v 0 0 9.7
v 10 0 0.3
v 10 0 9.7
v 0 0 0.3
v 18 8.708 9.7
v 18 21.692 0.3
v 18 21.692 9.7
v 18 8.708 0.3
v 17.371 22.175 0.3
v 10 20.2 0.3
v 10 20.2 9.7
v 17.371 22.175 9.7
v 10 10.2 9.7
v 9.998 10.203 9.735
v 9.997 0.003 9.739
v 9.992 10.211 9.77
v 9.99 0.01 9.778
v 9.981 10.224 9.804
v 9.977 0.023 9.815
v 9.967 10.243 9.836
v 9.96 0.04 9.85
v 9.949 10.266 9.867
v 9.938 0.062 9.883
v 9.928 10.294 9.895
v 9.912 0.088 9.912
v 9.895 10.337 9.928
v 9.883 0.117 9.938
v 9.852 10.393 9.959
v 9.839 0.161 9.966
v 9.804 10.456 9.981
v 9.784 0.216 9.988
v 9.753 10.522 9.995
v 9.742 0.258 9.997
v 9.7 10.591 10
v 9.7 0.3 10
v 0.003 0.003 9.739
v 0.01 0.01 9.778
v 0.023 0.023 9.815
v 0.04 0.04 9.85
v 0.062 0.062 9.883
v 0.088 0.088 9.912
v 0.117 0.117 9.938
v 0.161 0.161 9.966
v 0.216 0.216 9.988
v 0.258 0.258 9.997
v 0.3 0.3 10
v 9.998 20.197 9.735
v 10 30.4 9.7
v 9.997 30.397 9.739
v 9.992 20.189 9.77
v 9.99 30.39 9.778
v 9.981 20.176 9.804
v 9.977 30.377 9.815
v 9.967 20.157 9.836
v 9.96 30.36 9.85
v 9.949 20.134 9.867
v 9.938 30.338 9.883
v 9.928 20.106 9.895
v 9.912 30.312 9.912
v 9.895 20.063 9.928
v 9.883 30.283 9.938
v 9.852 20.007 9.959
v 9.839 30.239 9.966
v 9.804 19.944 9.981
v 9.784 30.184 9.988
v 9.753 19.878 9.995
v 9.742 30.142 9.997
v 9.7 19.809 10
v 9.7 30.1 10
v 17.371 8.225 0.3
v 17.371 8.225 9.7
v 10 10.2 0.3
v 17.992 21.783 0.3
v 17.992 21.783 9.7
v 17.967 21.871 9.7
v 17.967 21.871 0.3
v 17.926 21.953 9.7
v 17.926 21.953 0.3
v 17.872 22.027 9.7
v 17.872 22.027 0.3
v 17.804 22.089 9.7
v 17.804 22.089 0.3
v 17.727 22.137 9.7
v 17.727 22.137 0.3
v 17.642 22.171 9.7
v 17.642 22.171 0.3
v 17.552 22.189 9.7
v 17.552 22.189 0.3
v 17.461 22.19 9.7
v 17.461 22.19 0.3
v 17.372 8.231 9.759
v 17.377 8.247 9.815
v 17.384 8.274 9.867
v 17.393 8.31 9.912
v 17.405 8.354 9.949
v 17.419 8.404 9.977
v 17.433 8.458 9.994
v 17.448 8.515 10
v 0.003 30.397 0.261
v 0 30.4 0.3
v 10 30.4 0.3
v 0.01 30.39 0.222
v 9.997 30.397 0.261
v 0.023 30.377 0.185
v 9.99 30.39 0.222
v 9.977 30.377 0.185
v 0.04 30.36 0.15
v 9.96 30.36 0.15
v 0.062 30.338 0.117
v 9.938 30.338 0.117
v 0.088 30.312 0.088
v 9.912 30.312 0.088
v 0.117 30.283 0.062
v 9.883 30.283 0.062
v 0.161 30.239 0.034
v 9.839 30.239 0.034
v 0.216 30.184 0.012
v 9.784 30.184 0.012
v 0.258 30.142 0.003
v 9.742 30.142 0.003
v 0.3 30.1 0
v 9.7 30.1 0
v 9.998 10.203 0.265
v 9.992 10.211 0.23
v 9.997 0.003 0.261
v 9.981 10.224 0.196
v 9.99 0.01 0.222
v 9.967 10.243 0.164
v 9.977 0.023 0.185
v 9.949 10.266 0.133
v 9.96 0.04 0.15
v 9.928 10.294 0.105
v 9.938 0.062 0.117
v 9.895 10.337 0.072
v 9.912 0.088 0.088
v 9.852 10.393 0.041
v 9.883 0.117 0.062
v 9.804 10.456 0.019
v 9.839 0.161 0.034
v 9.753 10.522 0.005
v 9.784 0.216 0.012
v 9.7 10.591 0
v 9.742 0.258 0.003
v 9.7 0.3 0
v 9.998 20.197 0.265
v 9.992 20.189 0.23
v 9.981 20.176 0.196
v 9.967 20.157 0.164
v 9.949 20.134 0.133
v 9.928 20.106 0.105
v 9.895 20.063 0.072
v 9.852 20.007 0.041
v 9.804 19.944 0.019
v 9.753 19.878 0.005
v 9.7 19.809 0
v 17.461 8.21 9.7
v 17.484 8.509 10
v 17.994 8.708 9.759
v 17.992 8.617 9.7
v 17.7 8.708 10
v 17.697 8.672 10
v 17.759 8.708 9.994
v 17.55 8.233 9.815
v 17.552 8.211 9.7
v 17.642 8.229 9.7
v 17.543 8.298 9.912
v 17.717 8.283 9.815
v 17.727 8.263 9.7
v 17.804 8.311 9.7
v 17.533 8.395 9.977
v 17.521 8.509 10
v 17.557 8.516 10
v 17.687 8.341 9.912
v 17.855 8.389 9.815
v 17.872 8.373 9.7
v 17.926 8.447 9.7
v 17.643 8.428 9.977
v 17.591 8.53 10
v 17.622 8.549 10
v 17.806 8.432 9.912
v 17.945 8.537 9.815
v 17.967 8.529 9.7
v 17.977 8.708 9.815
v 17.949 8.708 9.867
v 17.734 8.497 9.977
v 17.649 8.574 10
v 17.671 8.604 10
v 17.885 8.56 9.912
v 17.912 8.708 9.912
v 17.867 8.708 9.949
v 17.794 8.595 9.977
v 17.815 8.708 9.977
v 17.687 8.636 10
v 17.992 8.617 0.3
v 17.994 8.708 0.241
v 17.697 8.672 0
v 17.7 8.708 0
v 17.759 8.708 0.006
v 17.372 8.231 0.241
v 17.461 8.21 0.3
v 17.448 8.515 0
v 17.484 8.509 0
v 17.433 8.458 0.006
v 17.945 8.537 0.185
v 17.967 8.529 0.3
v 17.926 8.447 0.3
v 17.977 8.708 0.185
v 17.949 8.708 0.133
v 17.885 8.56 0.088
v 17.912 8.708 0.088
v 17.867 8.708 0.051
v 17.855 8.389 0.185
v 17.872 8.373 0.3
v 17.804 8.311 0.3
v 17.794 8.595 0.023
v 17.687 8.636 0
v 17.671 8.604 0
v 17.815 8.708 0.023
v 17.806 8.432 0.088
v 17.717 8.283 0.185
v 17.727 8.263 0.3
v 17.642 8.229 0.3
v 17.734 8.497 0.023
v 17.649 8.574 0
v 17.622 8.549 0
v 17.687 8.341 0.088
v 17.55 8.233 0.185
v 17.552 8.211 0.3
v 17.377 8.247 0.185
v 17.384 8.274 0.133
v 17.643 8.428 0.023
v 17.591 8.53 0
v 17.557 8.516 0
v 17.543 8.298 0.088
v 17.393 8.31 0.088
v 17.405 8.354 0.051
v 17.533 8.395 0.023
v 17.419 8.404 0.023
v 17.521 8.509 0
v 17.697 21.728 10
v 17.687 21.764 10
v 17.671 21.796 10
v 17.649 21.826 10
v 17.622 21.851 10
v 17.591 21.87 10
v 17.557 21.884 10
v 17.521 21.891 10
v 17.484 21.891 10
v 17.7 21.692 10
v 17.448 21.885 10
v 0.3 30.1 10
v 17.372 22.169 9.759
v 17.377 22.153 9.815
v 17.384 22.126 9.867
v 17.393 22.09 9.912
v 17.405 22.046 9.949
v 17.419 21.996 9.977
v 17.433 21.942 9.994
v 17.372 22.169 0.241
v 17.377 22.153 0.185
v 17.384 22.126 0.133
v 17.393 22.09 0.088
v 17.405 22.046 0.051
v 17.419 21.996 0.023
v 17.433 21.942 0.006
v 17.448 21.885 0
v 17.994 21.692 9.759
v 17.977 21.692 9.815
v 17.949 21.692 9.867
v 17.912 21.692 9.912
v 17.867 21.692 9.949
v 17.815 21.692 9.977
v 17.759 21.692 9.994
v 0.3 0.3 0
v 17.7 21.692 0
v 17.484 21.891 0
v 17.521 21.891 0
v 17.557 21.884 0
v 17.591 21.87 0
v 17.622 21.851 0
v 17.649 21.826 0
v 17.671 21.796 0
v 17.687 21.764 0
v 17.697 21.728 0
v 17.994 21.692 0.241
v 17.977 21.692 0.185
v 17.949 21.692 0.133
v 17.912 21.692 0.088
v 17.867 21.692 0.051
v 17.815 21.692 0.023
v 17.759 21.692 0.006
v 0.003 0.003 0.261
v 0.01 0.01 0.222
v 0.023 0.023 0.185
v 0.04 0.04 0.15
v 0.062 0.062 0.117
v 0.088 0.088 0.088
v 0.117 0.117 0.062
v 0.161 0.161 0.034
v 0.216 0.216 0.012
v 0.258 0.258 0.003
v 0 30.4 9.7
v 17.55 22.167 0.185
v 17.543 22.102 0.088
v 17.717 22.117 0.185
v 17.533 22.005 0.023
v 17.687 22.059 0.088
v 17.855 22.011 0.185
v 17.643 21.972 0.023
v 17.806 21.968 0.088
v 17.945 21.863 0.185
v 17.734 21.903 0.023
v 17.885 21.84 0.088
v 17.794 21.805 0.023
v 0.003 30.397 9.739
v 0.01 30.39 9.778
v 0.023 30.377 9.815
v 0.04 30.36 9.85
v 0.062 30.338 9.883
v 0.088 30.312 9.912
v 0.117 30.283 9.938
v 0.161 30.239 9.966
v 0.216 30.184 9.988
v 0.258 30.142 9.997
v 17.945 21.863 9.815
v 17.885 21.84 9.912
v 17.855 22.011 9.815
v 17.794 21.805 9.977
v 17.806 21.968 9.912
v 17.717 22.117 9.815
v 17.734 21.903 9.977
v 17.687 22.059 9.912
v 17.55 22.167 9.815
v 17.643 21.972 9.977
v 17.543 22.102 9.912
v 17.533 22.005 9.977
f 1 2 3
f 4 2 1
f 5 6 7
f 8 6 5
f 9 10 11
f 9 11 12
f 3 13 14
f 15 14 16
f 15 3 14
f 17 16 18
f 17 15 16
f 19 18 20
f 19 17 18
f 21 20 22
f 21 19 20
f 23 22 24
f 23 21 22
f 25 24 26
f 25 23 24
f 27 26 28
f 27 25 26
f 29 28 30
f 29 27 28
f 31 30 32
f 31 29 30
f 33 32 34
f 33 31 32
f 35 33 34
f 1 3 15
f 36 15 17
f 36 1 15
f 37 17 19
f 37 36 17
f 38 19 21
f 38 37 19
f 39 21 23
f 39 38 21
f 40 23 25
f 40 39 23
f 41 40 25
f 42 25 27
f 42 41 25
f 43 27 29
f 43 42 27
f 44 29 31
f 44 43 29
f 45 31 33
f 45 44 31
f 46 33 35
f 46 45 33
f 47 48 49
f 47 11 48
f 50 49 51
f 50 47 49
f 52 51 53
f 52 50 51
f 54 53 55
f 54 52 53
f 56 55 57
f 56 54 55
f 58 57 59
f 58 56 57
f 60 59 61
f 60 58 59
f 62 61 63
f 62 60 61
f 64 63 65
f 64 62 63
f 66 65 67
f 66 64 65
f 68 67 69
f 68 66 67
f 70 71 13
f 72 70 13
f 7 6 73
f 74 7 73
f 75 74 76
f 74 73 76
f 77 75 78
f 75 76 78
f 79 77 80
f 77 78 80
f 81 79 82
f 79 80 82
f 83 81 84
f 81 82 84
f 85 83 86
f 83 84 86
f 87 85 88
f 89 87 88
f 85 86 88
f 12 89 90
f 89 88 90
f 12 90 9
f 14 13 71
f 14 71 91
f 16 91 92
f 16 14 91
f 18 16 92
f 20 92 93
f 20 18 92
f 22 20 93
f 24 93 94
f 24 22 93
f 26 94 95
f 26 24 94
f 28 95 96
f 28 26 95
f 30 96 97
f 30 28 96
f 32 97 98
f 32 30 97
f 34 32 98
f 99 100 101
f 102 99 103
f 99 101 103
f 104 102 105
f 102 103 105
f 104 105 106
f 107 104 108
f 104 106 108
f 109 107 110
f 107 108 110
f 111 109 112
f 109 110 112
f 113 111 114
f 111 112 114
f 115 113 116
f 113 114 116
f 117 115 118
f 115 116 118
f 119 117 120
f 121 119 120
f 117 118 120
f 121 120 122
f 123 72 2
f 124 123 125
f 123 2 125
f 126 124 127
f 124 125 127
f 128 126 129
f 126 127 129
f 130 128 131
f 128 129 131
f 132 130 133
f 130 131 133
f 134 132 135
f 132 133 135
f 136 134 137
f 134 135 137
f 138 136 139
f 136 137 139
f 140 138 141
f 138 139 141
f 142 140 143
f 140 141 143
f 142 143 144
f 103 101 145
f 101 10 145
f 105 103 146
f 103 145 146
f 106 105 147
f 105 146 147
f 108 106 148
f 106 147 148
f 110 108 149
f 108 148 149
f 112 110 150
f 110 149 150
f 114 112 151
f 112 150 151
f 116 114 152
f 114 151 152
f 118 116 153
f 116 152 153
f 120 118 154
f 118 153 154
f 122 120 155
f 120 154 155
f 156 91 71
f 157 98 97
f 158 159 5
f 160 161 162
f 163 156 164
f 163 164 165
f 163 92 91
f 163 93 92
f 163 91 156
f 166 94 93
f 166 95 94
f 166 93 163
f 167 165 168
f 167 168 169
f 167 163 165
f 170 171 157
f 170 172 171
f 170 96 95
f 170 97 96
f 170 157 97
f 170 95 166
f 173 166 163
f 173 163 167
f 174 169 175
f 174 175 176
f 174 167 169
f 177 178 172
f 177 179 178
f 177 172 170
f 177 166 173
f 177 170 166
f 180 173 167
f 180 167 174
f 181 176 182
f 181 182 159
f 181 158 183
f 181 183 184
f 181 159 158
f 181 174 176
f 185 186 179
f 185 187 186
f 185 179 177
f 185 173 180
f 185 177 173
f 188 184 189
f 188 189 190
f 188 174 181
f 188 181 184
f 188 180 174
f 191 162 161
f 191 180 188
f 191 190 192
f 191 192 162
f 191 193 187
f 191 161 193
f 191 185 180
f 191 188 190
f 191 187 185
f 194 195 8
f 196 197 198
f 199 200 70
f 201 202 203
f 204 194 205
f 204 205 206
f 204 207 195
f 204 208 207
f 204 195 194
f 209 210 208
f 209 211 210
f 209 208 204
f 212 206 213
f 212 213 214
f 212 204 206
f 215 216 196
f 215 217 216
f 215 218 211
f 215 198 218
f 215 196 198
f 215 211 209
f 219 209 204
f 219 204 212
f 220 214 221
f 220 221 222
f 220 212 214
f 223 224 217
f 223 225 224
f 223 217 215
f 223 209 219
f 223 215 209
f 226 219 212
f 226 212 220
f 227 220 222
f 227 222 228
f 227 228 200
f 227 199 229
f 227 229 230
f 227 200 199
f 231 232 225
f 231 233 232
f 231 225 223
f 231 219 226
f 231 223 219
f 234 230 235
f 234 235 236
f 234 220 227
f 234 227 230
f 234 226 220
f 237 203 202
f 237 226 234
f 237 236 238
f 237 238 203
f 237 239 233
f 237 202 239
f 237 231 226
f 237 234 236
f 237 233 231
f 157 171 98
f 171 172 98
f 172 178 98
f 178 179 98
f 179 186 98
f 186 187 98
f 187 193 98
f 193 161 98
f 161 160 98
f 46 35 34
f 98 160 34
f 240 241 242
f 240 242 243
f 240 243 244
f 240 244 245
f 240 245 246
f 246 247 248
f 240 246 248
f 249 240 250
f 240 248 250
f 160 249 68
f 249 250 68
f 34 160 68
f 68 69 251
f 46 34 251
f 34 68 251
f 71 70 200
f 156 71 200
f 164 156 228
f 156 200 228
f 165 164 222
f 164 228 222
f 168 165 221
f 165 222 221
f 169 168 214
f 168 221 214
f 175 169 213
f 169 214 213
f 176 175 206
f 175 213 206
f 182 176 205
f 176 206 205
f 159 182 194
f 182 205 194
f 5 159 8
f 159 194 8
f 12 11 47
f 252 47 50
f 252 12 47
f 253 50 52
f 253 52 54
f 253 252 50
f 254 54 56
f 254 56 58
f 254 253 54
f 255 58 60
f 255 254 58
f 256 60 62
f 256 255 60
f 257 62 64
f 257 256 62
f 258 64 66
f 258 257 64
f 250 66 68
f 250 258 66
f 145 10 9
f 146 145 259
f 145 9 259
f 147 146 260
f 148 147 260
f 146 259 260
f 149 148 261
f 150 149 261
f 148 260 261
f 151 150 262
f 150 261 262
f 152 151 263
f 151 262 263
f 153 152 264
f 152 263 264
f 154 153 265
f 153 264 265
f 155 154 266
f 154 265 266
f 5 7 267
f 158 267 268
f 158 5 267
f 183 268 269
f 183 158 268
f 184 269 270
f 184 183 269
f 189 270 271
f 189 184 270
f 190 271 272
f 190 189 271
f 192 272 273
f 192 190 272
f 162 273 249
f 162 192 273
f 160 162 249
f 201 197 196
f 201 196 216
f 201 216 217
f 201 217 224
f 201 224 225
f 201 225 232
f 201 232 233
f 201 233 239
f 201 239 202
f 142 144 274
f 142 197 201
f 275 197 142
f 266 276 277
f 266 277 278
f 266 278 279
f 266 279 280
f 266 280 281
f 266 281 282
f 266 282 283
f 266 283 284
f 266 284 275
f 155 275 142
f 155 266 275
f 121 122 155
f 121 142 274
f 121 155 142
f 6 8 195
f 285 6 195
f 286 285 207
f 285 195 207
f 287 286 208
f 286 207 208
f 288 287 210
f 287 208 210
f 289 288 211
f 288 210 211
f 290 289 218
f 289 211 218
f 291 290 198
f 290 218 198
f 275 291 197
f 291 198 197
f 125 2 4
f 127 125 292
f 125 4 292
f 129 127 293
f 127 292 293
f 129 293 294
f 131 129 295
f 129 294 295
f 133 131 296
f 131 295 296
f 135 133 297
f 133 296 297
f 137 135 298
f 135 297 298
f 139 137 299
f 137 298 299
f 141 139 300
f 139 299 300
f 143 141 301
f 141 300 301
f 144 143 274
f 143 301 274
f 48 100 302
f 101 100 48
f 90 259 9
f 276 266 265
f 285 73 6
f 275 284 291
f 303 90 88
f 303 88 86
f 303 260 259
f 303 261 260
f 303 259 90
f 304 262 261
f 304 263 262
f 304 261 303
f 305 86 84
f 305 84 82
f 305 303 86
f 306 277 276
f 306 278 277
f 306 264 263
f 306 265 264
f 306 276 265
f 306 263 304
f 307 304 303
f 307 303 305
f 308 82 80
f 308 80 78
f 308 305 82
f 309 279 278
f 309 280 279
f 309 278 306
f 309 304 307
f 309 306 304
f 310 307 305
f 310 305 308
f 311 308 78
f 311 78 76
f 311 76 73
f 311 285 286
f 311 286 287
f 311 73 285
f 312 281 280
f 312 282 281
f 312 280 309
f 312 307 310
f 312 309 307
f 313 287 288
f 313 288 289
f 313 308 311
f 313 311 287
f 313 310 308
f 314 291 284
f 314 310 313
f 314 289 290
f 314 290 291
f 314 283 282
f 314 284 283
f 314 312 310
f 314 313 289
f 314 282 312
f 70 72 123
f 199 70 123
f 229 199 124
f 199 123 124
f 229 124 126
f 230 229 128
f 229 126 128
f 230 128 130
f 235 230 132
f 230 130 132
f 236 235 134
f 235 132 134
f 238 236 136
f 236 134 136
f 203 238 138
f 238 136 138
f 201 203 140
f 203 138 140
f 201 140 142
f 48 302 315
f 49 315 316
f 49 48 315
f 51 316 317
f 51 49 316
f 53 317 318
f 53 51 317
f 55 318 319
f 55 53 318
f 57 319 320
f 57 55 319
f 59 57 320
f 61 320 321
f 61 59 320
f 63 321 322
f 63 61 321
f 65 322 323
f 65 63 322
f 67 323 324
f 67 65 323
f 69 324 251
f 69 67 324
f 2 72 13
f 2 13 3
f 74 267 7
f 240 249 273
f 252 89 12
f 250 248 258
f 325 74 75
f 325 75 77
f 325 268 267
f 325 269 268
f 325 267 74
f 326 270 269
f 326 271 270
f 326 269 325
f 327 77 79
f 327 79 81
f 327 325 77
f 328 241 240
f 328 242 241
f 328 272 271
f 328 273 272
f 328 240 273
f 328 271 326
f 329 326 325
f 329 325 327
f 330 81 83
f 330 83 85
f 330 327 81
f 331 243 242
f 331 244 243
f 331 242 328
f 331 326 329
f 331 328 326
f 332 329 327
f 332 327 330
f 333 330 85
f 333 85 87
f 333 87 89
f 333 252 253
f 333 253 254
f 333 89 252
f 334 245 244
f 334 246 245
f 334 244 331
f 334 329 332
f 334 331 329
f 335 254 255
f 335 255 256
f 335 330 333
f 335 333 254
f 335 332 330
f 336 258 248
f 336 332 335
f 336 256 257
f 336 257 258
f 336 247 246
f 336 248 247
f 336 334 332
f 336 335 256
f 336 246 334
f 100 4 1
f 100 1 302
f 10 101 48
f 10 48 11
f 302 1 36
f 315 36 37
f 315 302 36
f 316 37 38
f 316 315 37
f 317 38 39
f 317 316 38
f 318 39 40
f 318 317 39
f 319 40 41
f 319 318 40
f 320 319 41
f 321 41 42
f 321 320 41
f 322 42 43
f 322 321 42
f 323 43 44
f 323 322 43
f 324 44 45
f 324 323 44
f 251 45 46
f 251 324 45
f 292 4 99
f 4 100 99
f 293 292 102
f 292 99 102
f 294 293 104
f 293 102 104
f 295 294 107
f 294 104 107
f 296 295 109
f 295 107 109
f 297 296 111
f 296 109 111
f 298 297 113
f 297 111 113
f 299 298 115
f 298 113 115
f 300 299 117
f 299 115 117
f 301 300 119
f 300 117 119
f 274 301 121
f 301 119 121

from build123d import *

# Parameters (mm, degrees)
BOSS_EXTRU_1_DEPTH = 10
CONG_1_R           = 0.3
CONG_2_R           = 0.5


with BuildPart() as part:
    # Esquisse1 → Boss.-Extru.1 (new body)
    with BuildSketch(Plane.XY):
        Polygon((10, 20.2), (18, 22.343593539), (18, 8.056406461), (10, 10.2), (10, 0), (0, 0), (0, 30.4), (10, 30.4), align=None)
    extrude(amount=BOSS_EXTRU_1_DEPTH)

    # Congé1
    cong_1_edges = [part.edges().sort_by_distance(p)[0] for p in [
        (14, 9.12820323, 0),
        (10, 5.1, 0),
        (5, 0, 0),
        (0, 15.2, 0),
        (10, 5.1, 10),
        (14, 9.12820323, 10),
        (18, 15.2, 10),
        (14, 21.27179677, 10),
        (10, 25.3, 10),
        (5, 30.4, 10),
        (0, 15.2, 10),
        (5, 30.4, 0),
        (5, 0, 10),
        (10, 25.3, 0),
        (14, 21.27179677, 0),
        (18, 15.2, 0),
    ]]
    fillet(cong_1_edges, radius=CONG_1_R)

    # Congé2
    # the kernel refuses this fillet: 0.5 mm, written as the material it takes off along each edge
    with BuildSketch(Plane(origin=(17.5, 21.691980853, 0), x_dir=(-0.25881904510251885, 0.9659258262890689, 0), z_dir=(-0.9659258262890689, -0.25881904510251885, 0))) as cong_2_piece_1:
        with BuildLine():
            CenterArc((0.2, -0.3), 0.3, 0, 90)
            Line((0.5, -0.3), (0.5, 0))
            Line((0.5, 0), (0.2, 0))
        make_face()
    revolve(axis=Axis((17.5, 21.691980853, 0), (0, 0, -1)), revolution_arc=105, mode=Mode.SUBTRACT)
    with BuildSketch(Plane(origin=(17.5, 8.708019147, 0), x_dir=(1, 0, 0), z_dir=(0, 1, 0))) as cong_2_piece_2:
        with BuildLine():
            CenterArc((0.2, -0.3), 0.3, 0, 90)
            Line((0.5, -0.3), (0.5, 0))
            Line((0.5, 0), (0.2, 0))
        make_face()
    revolve(axis=Axis((17.5, 8.708019147, 0), (0, 0, -1)), revolution_arc=105, mode=Mode.SUBTRACT)
    with BuildSketch(Plane(origin=(17.5, 8.708019147, 10), x_dir=(-0.25881904510251746, -0.9659258262890692, 0), z_dir=(-0.9659258262890692, 0.25881904510251746, 0))) as cong_2_piece_3:
        with BuildLine():
            CenterArc((0.2, -0.3), 0.3, 0, 90)
            Line((0.5, -0.3), (0.5, 0))
            Line((0.5, 0), (0.2, 0))
        make_face()
    revolve(axis=Axis((17.5, 8.708019147, 10), (0, 0, 1)), revolution_arc=105, mode=Mode.SUBTRACT)
    with BuildSketch(Plane(origin=(17.5, 21.691980853, 10), x_dir=(1, 0, 0), z_dir=(0, -1, 0))) as cong_2_piece_4:
        with BuildLine():
            CenterArc((0.2, -0.3), 0.3, 0, 90)
            Line((0.5, -0.3), (0.5, 0))
            Line((0.5, 0), (0.2, 0))
        make_face()
    revolve(axis=Axis((17.5, 21.691980853, 10), (0, 0, 1)), revolution_arc=105, mode=Mode.SUBTRACT)
    with BuildSketch(Plane(origin=(18, 8.056406461, 0), x_dir=(0, 1, 0), z_dir=(0, 0, 1)), Plane(origin=(18, 22.343593539, 0), x_dir=(-0.9659258262890698, -0.2588190451025152, 0), z_dir=(0, 0, 1))) as cong_2_piece_5:
        with BuildLine():
            CenterArc((CONG_2_R * 1.30322537284, CONG_2_R), CONG_2_R, 165, 105)
            Line((CONG_2_R * 0.337299546552, CONG_2_R * 1.2588190451), (0, 0))
            Line((0, 0), (CONG_2_R * 1.30322537284, 0))
        make_face()
    extrude(amount=10, mode=Mode.SUBTRACT)


solid = part.part
